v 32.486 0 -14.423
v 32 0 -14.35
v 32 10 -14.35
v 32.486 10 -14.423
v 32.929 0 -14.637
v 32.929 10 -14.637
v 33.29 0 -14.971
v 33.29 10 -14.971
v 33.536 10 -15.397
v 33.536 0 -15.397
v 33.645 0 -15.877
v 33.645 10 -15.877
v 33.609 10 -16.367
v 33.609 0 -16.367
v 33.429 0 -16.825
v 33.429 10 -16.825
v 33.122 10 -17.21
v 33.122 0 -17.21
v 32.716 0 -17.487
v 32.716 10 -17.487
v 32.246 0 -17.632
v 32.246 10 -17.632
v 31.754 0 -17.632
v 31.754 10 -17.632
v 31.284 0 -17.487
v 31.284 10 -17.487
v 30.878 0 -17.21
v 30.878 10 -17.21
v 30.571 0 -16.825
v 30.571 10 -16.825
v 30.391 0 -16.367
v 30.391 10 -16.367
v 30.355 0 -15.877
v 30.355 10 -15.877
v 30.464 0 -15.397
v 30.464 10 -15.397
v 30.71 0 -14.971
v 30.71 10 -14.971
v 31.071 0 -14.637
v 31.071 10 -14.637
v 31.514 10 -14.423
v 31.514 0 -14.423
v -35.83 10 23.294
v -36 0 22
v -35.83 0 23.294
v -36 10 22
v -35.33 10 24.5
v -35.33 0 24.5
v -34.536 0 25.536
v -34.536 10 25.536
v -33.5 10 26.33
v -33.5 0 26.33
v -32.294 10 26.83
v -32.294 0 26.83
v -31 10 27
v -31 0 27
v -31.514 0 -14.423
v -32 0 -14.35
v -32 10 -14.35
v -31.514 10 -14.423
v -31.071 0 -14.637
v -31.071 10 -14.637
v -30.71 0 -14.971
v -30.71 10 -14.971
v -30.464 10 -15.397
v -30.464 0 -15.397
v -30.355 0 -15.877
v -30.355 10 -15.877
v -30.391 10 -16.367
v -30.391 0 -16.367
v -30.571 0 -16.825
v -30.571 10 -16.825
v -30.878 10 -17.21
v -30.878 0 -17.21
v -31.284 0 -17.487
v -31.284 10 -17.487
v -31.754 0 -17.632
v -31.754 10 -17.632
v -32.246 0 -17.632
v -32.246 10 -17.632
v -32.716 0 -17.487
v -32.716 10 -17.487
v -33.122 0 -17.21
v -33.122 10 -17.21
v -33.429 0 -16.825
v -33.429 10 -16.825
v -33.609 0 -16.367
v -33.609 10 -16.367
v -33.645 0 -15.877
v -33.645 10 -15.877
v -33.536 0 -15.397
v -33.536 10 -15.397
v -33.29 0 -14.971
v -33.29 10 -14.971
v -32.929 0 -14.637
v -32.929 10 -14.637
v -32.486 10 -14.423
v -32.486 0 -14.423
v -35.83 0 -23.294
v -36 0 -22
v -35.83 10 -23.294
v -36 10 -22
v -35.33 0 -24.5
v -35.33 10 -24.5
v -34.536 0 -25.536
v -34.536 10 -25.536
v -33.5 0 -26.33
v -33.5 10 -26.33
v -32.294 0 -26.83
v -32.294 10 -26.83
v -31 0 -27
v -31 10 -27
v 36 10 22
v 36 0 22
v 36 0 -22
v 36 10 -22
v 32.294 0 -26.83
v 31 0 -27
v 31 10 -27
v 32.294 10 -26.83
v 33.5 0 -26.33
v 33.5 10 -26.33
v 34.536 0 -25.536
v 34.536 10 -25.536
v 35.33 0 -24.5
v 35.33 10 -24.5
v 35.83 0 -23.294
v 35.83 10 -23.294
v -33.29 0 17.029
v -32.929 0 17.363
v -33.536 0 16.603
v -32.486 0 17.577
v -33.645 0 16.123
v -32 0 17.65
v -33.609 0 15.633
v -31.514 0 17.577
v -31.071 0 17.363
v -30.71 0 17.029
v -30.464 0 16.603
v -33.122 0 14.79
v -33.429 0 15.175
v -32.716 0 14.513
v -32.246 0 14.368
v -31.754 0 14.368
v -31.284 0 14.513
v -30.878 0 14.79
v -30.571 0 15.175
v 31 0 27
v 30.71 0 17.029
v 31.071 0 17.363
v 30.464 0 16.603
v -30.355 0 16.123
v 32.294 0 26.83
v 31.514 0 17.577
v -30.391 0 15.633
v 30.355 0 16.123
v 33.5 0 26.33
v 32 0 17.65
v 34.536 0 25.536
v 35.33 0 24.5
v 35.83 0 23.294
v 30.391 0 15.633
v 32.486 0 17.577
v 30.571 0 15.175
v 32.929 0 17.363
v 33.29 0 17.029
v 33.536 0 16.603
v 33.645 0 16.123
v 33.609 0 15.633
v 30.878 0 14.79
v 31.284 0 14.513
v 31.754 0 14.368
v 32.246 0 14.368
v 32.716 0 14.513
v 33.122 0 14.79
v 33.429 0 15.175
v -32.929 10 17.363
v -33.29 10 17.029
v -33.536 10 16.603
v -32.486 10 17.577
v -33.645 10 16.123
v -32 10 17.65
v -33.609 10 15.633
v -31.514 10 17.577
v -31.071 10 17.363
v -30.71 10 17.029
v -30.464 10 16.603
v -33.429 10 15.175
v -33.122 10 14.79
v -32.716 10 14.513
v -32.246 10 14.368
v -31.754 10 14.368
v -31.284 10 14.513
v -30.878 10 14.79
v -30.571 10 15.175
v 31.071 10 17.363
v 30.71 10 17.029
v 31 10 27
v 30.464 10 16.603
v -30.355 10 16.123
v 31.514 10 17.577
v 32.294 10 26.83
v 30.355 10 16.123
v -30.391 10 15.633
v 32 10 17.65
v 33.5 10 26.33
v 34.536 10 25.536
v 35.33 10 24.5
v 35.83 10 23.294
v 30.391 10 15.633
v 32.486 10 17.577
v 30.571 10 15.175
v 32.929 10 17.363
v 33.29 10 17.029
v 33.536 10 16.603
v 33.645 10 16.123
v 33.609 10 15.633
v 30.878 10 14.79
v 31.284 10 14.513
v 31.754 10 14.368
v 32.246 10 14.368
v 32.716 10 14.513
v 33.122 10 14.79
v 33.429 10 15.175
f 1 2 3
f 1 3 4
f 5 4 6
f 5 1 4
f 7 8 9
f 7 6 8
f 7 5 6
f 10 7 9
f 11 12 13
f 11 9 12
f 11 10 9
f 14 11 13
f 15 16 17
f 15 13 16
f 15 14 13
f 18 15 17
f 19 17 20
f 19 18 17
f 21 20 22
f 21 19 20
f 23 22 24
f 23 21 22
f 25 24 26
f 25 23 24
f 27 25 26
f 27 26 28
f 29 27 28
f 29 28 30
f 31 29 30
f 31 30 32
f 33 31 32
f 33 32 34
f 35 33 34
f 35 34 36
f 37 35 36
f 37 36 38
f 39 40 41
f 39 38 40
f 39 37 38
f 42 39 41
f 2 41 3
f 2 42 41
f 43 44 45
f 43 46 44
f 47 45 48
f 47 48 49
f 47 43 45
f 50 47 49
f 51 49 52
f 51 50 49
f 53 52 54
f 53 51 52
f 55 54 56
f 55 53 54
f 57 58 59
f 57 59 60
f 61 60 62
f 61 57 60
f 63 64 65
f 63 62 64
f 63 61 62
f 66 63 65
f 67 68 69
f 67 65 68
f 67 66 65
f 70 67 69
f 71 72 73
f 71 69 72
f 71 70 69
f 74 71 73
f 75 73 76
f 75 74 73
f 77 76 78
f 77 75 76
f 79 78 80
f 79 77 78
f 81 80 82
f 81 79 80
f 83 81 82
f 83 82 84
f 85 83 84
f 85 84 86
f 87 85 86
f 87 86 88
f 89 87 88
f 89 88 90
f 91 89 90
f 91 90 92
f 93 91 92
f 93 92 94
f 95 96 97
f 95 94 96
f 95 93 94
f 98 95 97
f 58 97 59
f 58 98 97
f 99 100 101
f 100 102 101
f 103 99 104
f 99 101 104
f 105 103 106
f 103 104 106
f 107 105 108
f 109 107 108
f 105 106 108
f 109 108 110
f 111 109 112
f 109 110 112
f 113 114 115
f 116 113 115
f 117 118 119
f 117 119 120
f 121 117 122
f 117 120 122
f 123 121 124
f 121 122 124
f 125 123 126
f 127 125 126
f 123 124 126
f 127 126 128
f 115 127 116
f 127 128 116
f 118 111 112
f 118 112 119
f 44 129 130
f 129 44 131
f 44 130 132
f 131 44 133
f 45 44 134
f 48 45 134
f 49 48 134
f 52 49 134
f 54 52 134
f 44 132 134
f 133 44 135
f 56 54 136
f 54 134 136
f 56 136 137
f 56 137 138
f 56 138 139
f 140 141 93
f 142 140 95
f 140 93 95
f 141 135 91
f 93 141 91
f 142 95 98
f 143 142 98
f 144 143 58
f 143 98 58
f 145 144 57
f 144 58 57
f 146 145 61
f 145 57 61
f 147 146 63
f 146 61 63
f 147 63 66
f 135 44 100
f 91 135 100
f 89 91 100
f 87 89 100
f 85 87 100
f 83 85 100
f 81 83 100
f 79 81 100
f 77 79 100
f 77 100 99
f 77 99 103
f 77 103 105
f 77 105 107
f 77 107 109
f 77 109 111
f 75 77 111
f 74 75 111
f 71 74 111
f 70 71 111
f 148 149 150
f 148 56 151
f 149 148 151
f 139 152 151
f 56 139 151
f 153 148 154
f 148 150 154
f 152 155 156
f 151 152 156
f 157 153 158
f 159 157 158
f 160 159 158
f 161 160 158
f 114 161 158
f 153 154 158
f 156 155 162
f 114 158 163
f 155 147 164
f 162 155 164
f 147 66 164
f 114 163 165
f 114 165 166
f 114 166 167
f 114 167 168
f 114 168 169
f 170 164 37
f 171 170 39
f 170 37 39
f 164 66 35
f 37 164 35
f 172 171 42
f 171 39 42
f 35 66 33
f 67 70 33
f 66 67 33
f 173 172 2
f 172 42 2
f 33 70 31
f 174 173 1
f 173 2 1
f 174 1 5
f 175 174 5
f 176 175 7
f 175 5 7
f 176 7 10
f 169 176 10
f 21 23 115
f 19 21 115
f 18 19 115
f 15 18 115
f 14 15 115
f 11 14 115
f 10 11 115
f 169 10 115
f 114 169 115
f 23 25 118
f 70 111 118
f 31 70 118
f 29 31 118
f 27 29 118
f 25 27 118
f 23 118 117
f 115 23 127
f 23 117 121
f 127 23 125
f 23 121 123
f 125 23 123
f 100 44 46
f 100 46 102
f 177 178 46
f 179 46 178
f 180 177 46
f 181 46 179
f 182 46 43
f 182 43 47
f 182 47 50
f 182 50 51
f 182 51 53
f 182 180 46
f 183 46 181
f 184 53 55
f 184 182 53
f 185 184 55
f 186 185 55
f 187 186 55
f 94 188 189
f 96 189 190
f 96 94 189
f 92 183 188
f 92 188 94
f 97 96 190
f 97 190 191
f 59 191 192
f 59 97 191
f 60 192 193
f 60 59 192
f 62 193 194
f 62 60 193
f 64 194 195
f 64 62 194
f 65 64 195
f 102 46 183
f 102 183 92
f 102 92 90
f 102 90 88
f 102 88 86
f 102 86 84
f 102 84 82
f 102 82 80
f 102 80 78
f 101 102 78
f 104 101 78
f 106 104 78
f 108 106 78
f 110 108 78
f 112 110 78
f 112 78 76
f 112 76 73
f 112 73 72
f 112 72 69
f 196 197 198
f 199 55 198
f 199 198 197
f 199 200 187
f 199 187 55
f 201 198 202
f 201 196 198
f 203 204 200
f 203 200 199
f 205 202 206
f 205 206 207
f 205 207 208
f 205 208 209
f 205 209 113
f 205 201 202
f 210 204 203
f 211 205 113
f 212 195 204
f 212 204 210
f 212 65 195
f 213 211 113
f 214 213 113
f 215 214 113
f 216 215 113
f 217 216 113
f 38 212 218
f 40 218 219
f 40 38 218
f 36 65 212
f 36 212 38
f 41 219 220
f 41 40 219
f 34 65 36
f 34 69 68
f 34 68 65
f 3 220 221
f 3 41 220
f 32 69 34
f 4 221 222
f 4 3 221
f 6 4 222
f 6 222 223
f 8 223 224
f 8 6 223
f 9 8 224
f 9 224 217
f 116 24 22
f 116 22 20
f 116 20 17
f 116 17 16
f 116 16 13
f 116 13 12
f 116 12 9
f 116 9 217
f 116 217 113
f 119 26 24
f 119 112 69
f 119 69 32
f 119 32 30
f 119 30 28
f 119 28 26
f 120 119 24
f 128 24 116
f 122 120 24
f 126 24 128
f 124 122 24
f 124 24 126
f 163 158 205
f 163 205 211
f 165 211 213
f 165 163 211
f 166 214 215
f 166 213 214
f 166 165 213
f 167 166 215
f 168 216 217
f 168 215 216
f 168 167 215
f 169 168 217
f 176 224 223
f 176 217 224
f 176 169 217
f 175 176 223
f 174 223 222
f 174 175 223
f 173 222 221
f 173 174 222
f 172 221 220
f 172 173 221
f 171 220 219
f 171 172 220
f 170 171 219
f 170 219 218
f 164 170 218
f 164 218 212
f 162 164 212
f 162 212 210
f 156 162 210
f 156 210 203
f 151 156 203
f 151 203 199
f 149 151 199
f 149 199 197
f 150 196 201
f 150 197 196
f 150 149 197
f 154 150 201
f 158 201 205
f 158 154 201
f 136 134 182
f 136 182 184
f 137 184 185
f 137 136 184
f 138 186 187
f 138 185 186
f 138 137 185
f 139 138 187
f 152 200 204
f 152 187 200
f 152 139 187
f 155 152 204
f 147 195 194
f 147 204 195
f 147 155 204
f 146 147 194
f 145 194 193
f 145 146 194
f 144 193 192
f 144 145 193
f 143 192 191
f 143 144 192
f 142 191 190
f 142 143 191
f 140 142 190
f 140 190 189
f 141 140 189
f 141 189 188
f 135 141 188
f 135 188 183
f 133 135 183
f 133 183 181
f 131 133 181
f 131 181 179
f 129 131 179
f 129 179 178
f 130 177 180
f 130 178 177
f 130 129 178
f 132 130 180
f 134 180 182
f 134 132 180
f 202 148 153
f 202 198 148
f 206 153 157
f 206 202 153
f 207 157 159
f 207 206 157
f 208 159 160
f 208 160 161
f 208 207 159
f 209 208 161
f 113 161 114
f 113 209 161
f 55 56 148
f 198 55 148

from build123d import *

# Parameters (mm, degrees)
SKETCH_1_W               = 72
SKETCH_1_H               = 54
EXTRUDE_1_DEPTH          = 10
CUT_EXTRUDE_1_DEPTH      = 47.097722286
CUT_EXTRUDE_1_DEPTH_BACK = 47.097722286
SKETCH_2_R               = 1.65
FILLET_1_R               = 5


with BuildPart() as part:
    # 草图1 → 凸台-拉伸1 (new body)
    with BuildSketch(Plane(origin=(0, 0, 0), x_dir=(1, 0, 0), z_dir=(0, 1, 0))):
        Rectangle(SKETCH_1_W, SKETCH_1_H)
    extrude(amount=EXTRUDE_1_DEPTH)

    # 草图2 → 切除-拉伸1 (cut, two sides: drawn at the far end of the back side and taken through both)
    with BuildSketch(Plane(origin=(0, 10, 0), x_dir=(1, 0, 0), z_dir=(0, 1, 0)).offset(-CUT_EXTRUDE_1_DEPTH_BACK)):
        with Locations(Location((-32, 16, 0), (0, 0, 270))):
            Circle(SKETCH_2_R)
        with Locations(Location((32, 16, 0), (0, 0, 270))):
            Circle(SKETCH_2_R)
        with Locations(Location((32, -16, 0), (0, 0, 270))):
            Circle(SKETCH_2_R)
        with Locations(Location((-32, -16, 0), (0, 0, 270))):
            Circle(SKETCH_2_R)
    extrude(amount=CUT_EXTRUDE_1_DEPTH + CUT_EXTRUDE_1_DEPTH_BACK, mode=Mode.SUBTRACT)

    # 圆角1
    fillet_1_edges = [part.edges().sort_by_distance(p)[0] for p in [
        (36, 5, 27),
        (-36, 5, 27),
        (-36, 5, -27),
        (36, 5, -27),
    ]]
    fillet(fillet_1_edges, radius=FILLET_1_R)


solid = part.part
